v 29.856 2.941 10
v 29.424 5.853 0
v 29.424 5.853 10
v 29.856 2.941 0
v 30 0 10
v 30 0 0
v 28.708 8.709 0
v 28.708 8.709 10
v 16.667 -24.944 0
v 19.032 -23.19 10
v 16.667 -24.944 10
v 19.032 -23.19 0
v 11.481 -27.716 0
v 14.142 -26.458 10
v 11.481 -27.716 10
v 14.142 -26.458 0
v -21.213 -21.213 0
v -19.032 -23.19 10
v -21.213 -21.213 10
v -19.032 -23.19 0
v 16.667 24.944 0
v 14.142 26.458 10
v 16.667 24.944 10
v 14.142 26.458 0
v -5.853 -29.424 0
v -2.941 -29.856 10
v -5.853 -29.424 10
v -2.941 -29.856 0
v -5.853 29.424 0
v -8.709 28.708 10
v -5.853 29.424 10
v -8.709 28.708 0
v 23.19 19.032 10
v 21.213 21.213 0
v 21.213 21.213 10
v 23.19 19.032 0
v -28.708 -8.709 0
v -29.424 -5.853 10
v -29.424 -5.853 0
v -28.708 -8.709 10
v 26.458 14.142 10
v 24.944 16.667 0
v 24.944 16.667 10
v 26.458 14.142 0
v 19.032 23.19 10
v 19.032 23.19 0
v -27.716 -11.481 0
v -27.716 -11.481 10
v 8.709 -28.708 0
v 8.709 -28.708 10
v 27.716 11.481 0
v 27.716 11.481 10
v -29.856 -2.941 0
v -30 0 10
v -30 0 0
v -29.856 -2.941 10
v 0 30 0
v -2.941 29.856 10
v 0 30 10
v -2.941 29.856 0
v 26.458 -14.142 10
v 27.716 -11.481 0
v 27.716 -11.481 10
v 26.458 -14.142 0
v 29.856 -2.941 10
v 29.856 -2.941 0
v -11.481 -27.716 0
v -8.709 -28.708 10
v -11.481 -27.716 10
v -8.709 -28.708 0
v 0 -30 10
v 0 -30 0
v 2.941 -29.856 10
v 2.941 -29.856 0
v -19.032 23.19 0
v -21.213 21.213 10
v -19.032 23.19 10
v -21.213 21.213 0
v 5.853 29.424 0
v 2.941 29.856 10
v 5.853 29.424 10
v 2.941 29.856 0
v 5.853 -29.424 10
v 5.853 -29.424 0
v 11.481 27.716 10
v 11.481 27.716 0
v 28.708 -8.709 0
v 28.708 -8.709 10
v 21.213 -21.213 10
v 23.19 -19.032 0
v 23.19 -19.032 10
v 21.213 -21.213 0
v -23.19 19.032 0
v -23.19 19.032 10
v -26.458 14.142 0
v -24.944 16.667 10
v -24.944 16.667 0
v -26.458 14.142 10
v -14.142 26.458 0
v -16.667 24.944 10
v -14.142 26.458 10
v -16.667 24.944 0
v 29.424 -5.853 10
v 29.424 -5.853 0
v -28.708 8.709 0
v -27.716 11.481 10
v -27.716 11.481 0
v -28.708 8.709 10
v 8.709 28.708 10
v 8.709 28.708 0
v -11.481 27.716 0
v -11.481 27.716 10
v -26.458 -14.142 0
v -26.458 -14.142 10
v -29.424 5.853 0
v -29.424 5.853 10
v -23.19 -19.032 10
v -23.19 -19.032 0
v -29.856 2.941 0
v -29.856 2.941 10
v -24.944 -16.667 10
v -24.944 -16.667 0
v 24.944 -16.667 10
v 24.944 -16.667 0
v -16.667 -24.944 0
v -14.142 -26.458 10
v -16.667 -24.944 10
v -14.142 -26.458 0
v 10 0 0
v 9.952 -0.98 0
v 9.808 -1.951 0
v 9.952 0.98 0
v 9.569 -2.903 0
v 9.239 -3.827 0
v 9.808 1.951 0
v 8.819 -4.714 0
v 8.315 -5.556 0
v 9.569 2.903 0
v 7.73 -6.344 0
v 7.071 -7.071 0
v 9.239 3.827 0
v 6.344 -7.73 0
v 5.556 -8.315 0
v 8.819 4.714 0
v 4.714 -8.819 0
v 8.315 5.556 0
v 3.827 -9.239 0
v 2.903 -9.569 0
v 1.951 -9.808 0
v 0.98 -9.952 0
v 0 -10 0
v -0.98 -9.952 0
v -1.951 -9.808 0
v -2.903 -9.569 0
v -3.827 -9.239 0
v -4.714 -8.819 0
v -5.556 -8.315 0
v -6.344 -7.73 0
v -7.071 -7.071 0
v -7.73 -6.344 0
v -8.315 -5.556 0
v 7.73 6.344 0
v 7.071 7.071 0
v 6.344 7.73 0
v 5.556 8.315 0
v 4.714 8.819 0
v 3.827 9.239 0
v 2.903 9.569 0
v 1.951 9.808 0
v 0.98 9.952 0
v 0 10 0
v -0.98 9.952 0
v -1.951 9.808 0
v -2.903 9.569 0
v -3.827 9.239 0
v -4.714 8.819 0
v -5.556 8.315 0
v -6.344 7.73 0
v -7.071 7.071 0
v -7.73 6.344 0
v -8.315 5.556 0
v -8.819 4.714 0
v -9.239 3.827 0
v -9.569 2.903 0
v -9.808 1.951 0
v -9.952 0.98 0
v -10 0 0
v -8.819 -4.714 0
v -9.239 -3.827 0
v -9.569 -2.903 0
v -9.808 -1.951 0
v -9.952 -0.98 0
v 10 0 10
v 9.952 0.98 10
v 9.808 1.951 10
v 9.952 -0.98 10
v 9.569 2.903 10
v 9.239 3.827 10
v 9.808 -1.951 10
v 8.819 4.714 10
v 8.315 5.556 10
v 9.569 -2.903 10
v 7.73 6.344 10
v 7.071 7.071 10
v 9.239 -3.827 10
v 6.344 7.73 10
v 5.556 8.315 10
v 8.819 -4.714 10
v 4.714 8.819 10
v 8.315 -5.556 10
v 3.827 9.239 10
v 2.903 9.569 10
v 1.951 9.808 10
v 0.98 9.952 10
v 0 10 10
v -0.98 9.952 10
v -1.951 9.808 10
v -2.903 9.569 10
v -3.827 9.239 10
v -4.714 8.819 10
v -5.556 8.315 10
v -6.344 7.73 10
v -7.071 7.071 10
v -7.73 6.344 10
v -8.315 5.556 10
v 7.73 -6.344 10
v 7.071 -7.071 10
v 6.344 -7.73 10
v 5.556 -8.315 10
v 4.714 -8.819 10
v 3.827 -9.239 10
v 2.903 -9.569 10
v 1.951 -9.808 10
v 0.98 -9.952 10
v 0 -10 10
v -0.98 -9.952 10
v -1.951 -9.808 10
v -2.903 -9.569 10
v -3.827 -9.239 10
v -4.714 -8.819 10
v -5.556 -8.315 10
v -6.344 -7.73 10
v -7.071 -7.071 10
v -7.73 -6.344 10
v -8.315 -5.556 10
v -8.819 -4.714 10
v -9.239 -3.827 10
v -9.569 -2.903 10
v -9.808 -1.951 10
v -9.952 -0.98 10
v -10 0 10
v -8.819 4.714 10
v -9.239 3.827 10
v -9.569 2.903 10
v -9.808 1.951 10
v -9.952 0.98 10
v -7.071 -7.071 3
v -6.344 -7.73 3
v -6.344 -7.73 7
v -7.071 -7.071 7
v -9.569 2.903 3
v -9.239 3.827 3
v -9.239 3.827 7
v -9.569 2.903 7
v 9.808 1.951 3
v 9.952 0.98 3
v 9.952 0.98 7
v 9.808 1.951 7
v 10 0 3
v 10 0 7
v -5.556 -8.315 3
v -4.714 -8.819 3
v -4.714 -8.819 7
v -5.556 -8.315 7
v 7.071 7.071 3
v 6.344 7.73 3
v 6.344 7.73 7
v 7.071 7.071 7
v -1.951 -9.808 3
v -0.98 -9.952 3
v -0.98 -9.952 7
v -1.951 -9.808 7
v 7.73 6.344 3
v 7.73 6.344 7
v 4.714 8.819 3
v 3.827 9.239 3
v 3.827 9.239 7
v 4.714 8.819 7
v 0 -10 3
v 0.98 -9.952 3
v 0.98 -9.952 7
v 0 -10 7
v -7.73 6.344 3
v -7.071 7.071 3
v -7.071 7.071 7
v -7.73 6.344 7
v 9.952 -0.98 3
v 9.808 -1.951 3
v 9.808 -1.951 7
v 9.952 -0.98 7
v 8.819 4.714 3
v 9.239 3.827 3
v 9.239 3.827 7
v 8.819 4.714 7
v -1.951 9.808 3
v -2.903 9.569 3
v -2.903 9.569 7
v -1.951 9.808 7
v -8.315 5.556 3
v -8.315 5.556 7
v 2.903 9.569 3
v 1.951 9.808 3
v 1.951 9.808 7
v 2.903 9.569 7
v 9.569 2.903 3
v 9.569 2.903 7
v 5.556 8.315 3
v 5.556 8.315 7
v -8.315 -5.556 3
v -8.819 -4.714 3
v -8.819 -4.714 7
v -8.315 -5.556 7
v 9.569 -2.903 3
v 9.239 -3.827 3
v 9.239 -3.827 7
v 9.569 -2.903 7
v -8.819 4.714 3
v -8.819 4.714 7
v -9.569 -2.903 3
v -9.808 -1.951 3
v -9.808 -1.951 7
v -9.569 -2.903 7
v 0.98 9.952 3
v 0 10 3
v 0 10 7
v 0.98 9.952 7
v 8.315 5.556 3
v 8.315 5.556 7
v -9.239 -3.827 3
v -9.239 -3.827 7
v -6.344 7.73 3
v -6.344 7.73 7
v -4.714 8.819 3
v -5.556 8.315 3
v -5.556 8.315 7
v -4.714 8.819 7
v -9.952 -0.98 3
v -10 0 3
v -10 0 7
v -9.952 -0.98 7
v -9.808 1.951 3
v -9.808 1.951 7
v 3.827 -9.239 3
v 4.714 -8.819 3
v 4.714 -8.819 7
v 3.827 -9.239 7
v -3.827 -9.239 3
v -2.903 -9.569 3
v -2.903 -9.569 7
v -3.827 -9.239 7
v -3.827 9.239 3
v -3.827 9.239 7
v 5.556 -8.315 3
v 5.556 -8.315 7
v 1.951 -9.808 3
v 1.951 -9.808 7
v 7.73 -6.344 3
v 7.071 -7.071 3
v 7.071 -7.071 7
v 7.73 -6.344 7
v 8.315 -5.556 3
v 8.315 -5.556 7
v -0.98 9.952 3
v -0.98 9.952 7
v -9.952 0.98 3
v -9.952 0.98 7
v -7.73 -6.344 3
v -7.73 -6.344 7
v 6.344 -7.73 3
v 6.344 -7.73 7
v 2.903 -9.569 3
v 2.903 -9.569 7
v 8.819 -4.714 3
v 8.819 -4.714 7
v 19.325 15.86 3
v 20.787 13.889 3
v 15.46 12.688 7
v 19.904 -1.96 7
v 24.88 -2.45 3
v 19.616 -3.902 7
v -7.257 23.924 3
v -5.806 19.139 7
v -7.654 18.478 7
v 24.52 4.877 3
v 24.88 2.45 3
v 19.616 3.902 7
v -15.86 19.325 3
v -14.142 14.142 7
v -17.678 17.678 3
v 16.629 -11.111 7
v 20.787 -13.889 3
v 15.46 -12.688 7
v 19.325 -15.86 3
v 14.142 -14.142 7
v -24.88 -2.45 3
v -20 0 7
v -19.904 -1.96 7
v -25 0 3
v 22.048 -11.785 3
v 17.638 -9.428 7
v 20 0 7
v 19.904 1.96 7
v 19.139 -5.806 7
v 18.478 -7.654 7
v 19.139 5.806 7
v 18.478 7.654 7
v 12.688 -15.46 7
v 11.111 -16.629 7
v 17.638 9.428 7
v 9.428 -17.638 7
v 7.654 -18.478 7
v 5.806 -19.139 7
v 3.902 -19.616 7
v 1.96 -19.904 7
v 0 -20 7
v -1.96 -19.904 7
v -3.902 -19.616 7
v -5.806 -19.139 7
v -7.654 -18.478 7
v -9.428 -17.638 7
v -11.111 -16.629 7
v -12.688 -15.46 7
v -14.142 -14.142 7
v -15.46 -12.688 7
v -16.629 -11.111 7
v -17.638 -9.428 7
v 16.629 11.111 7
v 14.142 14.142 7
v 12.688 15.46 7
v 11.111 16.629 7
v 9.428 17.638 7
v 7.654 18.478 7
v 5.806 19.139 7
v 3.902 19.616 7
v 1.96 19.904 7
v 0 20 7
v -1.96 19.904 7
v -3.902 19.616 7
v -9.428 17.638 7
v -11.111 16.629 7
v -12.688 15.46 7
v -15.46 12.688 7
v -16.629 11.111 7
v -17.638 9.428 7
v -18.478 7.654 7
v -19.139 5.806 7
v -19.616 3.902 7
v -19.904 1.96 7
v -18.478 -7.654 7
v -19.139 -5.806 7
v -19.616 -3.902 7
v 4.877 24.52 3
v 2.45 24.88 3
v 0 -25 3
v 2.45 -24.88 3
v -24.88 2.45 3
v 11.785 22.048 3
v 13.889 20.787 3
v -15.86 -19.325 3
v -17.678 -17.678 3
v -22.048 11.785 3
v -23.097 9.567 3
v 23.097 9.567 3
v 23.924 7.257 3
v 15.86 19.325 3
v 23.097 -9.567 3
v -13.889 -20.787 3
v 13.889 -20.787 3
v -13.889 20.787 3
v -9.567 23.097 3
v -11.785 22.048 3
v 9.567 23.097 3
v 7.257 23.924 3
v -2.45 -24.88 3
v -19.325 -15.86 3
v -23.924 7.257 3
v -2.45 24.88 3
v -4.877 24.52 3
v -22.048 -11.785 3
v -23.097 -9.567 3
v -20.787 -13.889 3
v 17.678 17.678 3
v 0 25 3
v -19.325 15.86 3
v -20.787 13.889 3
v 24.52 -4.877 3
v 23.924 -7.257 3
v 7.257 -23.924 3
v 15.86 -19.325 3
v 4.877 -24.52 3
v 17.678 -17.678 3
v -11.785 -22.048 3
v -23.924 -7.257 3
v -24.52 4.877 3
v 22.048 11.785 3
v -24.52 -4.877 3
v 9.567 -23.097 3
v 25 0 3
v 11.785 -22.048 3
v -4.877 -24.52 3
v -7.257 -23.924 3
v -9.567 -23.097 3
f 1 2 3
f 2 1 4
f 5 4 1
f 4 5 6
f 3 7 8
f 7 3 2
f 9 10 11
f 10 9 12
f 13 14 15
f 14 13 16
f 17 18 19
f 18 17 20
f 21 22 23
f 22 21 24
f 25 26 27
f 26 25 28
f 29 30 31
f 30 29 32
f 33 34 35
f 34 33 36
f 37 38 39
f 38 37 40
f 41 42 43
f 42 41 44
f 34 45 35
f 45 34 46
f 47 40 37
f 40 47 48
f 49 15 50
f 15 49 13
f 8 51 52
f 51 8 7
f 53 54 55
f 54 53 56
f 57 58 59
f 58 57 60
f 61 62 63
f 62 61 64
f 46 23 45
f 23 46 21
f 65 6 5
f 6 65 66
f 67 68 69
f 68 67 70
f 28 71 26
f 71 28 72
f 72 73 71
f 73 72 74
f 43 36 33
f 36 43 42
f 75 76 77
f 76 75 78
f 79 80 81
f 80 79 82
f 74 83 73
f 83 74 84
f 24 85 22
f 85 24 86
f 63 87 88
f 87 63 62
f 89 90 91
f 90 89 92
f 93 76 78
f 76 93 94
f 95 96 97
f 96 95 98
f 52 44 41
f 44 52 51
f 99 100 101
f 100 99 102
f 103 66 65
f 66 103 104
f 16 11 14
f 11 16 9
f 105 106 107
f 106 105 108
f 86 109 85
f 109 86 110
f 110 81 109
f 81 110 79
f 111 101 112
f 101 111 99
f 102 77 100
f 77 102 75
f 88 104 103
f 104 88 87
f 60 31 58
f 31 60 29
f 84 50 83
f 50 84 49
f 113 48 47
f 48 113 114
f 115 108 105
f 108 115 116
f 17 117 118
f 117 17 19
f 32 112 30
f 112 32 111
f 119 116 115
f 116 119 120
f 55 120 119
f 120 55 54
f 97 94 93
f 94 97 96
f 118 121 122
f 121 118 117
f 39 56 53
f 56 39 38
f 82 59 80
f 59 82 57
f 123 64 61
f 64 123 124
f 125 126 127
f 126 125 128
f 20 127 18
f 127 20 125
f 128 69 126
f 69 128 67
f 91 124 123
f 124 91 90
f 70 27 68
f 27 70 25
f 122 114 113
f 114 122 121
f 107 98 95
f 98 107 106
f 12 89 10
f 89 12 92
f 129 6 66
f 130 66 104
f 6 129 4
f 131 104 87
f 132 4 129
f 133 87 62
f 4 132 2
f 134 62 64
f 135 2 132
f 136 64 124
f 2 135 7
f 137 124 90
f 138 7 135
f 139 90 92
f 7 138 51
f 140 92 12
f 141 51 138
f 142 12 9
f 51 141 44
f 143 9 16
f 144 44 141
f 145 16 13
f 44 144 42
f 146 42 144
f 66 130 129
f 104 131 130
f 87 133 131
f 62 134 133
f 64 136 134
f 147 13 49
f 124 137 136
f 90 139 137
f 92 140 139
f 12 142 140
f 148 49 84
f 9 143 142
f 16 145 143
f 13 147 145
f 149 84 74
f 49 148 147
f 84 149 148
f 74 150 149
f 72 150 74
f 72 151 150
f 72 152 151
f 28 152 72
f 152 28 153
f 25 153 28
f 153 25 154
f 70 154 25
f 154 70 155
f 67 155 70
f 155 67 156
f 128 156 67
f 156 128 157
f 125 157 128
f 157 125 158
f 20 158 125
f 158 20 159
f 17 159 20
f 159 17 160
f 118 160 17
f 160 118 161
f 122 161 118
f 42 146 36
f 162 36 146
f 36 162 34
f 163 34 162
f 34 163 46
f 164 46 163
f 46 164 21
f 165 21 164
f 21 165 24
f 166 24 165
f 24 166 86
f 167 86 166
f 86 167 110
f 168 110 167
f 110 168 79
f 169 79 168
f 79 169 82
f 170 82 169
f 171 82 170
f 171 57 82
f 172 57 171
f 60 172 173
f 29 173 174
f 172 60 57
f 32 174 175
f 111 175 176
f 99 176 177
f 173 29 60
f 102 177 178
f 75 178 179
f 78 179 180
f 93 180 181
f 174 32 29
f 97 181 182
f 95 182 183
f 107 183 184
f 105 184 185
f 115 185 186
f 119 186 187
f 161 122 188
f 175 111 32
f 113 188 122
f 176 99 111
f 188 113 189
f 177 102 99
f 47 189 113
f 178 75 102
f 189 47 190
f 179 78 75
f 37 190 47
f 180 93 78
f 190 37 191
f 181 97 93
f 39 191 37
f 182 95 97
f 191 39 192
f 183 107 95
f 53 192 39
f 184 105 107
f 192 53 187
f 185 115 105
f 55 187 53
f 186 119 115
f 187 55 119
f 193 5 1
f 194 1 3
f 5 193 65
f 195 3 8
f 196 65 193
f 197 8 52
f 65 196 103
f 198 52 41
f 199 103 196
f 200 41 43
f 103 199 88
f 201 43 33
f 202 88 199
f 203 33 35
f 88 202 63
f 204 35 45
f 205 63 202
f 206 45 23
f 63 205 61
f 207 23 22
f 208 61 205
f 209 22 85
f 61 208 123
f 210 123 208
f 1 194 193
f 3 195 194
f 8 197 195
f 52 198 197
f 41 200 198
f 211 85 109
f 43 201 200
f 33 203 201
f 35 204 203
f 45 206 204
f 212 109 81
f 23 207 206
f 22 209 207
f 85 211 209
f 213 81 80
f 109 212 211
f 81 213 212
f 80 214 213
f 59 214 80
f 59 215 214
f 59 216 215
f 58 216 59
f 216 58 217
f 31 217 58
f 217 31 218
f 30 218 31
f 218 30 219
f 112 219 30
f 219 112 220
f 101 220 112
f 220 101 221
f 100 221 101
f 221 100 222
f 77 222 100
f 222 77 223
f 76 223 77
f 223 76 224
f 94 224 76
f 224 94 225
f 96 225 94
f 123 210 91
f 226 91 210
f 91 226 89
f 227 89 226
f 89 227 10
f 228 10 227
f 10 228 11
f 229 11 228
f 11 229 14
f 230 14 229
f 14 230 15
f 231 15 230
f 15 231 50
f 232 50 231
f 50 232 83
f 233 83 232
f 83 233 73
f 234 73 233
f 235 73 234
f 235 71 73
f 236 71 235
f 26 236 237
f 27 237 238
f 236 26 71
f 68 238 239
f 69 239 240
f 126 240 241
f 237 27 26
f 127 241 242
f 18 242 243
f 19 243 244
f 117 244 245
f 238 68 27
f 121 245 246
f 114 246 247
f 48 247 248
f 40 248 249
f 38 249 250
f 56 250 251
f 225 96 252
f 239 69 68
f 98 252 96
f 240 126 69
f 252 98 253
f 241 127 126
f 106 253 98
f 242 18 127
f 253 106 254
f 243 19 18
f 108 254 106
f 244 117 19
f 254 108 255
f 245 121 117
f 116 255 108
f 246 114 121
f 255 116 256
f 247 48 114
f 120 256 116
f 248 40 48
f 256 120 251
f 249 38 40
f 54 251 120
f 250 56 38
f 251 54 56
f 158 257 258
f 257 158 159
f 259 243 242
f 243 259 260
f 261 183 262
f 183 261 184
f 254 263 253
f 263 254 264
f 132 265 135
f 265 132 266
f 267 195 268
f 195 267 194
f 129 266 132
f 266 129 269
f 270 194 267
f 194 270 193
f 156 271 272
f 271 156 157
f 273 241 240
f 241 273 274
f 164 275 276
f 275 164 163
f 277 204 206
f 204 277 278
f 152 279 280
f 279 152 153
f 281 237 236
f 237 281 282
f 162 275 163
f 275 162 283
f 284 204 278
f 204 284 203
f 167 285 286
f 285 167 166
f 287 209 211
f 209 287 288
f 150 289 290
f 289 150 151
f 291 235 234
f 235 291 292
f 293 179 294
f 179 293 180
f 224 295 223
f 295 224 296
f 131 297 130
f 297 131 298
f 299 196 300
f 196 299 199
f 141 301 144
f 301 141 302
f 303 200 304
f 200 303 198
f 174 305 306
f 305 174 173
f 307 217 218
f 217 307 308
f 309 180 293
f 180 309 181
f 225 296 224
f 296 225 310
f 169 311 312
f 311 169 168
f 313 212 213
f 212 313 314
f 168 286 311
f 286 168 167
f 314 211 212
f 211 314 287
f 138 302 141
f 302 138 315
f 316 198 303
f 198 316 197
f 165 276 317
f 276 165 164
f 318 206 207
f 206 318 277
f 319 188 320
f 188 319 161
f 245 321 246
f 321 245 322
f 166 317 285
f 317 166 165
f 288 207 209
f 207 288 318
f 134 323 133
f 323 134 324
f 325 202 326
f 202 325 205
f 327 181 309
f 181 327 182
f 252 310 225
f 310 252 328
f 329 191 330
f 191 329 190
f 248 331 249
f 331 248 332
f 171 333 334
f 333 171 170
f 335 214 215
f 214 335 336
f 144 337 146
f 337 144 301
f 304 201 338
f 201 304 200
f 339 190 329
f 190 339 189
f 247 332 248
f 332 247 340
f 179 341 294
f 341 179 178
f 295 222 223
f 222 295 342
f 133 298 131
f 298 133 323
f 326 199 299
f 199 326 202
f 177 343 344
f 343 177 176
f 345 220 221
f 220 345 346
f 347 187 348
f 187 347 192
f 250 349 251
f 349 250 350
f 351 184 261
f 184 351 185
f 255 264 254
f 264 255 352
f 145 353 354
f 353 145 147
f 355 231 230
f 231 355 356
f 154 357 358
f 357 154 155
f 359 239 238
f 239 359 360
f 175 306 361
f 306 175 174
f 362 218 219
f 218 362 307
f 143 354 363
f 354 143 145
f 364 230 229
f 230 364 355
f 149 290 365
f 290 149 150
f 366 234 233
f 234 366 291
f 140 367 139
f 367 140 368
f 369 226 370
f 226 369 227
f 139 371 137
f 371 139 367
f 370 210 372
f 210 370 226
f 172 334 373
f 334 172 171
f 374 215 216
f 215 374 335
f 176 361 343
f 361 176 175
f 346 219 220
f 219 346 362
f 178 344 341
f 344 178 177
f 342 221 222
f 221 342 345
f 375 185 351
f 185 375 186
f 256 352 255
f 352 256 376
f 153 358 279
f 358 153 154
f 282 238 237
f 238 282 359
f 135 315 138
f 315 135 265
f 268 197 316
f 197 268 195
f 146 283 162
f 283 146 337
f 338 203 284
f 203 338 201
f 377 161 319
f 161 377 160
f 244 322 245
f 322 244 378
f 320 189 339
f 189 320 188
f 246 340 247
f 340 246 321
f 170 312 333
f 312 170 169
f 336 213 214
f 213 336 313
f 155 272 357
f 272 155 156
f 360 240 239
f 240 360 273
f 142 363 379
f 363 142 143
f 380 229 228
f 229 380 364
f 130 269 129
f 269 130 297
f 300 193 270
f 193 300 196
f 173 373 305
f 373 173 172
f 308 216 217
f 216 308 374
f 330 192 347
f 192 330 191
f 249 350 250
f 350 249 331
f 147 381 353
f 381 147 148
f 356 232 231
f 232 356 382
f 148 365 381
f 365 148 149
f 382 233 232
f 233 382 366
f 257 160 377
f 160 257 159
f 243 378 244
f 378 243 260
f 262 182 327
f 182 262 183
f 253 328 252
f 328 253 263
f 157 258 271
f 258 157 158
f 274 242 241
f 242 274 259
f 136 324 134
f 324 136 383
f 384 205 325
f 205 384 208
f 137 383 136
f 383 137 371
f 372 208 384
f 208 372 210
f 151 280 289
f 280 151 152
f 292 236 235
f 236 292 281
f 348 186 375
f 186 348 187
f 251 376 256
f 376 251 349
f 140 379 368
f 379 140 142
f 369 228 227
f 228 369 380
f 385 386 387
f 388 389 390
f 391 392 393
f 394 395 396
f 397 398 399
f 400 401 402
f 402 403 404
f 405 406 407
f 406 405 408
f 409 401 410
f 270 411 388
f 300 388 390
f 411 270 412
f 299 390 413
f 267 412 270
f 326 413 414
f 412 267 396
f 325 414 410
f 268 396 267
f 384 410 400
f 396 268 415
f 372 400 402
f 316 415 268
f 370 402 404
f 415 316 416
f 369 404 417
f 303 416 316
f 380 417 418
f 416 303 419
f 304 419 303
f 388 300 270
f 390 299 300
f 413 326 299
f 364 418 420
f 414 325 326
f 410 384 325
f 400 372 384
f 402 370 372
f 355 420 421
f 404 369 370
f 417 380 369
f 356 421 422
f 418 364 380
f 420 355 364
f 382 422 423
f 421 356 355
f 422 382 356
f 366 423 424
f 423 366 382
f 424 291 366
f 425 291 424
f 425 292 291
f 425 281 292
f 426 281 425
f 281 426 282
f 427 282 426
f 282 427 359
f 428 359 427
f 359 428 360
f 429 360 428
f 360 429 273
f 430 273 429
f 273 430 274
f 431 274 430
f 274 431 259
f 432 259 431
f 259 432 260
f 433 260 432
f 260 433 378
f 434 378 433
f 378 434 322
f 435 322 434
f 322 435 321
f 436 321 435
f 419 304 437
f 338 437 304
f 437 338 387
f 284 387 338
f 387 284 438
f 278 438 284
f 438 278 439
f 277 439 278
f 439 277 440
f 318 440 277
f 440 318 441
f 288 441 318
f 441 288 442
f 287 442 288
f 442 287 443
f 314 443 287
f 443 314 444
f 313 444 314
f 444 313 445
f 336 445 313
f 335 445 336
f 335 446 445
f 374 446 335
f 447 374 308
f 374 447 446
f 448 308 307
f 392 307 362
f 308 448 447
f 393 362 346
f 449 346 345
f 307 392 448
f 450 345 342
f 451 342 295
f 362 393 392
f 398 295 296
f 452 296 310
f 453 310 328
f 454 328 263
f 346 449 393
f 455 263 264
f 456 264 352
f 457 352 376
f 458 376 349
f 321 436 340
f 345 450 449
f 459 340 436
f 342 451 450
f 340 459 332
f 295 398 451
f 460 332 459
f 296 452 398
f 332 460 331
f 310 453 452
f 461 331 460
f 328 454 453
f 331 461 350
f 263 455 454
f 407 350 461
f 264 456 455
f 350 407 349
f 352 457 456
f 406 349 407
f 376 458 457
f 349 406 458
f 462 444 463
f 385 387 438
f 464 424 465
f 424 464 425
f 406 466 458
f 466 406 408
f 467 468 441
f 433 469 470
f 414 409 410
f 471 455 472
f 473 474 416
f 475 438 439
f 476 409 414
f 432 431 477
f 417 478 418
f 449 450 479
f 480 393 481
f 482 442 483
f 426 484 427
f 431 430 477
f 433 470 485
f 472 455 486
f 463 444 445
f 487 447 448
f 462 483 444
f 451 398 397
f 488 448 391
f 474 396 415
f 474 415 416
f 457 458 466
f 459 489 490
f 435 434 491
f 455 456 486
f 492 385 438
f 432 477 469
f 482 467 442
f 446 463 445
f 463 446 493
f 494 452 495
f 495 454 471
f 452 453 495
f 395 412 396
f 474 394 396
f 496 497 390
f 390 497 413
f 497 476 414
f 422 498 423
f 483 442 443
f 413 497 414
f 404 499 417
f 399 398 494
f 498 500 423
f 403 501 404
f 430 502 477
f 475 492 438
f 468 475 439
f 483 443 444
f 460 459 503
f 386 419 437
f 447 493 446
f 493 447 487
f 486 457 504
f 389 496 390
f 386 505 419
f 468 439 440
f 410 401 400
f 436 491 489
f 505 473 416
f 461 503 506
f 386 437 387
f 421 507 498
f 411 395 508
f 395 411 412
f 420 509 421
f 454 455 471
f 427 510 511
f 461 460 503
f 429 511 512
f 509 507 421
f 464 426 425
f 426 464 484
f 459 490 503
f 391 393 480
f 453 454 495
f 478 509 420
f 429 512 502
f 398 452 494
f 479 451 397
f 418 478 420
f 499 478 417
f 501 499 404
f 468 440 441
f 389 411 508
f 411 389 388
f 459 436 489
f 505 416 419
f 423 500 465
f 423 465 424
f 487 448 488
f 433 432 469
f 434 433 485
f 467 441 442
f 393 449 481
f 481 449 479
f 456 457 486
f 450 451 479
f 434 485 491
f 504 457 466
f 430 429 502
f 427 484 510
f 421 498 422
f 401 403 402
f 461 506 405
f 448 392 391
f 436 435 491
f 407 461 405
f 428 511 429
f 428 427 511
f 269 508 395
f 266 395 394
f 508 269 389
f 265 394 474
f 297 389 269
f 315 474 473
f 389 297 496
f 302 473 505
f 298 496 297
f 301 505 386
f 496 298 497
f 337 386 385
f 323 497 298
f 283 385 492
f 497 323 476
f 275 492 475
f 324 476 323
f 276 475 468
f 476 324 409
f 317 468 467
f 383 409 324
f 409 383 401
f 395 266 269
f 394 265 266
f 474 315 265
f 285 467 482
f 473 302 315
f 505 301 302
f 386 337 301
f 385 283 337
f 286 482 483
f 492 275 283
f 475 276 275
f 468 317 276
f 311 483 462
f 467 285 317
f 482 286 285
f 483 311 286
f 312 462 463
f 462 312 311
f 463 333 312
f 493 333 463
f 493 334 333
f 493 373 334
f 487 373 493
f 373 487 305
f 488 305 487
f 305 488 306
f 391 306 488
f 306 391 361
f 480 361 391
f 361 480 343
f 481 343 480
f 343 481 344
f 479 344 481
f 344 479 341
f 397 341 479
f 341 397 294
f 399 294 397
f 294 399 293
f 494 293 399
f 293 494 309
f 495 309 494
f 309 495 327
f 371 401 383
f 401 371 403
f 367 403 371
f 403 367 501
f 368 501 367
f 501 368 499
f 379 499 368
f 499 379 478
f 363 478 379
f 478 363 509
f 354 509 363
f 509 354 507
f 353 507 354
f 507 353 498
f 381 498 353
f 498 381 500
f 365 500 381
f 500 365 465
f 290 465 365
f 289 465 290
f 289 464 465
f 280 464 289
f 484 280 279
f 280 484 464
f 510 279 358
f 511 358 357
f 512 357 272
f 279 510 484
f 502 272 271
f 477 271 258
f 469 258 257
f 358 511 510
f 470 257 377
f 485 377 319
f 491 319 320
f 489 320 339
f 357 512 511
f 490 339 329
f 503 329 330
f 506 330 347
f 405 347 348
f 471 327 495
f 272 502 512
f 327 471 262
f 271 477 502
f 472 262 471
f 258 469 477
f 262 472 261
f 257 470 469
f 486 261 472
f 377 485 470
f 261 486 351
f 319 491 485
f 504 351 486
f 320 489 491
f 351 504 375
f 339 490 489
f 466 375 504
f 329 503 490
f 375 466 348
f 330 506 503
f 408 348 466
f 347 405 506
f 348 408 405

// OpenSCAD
module pulley() {
    difference() {
        // Outer cylinder
        cylinder(h=10, r=30, $fn=64);
        // Inner cylinder (hole)
        translate([0, 0, -1])
            cylinder(h=12, r=10, $fn=64);
        // Groove
        translate([0, 0, 3])
            cylinder(h=4, r1=25, r2=20, $fn=64);
    }
}

pulley();
